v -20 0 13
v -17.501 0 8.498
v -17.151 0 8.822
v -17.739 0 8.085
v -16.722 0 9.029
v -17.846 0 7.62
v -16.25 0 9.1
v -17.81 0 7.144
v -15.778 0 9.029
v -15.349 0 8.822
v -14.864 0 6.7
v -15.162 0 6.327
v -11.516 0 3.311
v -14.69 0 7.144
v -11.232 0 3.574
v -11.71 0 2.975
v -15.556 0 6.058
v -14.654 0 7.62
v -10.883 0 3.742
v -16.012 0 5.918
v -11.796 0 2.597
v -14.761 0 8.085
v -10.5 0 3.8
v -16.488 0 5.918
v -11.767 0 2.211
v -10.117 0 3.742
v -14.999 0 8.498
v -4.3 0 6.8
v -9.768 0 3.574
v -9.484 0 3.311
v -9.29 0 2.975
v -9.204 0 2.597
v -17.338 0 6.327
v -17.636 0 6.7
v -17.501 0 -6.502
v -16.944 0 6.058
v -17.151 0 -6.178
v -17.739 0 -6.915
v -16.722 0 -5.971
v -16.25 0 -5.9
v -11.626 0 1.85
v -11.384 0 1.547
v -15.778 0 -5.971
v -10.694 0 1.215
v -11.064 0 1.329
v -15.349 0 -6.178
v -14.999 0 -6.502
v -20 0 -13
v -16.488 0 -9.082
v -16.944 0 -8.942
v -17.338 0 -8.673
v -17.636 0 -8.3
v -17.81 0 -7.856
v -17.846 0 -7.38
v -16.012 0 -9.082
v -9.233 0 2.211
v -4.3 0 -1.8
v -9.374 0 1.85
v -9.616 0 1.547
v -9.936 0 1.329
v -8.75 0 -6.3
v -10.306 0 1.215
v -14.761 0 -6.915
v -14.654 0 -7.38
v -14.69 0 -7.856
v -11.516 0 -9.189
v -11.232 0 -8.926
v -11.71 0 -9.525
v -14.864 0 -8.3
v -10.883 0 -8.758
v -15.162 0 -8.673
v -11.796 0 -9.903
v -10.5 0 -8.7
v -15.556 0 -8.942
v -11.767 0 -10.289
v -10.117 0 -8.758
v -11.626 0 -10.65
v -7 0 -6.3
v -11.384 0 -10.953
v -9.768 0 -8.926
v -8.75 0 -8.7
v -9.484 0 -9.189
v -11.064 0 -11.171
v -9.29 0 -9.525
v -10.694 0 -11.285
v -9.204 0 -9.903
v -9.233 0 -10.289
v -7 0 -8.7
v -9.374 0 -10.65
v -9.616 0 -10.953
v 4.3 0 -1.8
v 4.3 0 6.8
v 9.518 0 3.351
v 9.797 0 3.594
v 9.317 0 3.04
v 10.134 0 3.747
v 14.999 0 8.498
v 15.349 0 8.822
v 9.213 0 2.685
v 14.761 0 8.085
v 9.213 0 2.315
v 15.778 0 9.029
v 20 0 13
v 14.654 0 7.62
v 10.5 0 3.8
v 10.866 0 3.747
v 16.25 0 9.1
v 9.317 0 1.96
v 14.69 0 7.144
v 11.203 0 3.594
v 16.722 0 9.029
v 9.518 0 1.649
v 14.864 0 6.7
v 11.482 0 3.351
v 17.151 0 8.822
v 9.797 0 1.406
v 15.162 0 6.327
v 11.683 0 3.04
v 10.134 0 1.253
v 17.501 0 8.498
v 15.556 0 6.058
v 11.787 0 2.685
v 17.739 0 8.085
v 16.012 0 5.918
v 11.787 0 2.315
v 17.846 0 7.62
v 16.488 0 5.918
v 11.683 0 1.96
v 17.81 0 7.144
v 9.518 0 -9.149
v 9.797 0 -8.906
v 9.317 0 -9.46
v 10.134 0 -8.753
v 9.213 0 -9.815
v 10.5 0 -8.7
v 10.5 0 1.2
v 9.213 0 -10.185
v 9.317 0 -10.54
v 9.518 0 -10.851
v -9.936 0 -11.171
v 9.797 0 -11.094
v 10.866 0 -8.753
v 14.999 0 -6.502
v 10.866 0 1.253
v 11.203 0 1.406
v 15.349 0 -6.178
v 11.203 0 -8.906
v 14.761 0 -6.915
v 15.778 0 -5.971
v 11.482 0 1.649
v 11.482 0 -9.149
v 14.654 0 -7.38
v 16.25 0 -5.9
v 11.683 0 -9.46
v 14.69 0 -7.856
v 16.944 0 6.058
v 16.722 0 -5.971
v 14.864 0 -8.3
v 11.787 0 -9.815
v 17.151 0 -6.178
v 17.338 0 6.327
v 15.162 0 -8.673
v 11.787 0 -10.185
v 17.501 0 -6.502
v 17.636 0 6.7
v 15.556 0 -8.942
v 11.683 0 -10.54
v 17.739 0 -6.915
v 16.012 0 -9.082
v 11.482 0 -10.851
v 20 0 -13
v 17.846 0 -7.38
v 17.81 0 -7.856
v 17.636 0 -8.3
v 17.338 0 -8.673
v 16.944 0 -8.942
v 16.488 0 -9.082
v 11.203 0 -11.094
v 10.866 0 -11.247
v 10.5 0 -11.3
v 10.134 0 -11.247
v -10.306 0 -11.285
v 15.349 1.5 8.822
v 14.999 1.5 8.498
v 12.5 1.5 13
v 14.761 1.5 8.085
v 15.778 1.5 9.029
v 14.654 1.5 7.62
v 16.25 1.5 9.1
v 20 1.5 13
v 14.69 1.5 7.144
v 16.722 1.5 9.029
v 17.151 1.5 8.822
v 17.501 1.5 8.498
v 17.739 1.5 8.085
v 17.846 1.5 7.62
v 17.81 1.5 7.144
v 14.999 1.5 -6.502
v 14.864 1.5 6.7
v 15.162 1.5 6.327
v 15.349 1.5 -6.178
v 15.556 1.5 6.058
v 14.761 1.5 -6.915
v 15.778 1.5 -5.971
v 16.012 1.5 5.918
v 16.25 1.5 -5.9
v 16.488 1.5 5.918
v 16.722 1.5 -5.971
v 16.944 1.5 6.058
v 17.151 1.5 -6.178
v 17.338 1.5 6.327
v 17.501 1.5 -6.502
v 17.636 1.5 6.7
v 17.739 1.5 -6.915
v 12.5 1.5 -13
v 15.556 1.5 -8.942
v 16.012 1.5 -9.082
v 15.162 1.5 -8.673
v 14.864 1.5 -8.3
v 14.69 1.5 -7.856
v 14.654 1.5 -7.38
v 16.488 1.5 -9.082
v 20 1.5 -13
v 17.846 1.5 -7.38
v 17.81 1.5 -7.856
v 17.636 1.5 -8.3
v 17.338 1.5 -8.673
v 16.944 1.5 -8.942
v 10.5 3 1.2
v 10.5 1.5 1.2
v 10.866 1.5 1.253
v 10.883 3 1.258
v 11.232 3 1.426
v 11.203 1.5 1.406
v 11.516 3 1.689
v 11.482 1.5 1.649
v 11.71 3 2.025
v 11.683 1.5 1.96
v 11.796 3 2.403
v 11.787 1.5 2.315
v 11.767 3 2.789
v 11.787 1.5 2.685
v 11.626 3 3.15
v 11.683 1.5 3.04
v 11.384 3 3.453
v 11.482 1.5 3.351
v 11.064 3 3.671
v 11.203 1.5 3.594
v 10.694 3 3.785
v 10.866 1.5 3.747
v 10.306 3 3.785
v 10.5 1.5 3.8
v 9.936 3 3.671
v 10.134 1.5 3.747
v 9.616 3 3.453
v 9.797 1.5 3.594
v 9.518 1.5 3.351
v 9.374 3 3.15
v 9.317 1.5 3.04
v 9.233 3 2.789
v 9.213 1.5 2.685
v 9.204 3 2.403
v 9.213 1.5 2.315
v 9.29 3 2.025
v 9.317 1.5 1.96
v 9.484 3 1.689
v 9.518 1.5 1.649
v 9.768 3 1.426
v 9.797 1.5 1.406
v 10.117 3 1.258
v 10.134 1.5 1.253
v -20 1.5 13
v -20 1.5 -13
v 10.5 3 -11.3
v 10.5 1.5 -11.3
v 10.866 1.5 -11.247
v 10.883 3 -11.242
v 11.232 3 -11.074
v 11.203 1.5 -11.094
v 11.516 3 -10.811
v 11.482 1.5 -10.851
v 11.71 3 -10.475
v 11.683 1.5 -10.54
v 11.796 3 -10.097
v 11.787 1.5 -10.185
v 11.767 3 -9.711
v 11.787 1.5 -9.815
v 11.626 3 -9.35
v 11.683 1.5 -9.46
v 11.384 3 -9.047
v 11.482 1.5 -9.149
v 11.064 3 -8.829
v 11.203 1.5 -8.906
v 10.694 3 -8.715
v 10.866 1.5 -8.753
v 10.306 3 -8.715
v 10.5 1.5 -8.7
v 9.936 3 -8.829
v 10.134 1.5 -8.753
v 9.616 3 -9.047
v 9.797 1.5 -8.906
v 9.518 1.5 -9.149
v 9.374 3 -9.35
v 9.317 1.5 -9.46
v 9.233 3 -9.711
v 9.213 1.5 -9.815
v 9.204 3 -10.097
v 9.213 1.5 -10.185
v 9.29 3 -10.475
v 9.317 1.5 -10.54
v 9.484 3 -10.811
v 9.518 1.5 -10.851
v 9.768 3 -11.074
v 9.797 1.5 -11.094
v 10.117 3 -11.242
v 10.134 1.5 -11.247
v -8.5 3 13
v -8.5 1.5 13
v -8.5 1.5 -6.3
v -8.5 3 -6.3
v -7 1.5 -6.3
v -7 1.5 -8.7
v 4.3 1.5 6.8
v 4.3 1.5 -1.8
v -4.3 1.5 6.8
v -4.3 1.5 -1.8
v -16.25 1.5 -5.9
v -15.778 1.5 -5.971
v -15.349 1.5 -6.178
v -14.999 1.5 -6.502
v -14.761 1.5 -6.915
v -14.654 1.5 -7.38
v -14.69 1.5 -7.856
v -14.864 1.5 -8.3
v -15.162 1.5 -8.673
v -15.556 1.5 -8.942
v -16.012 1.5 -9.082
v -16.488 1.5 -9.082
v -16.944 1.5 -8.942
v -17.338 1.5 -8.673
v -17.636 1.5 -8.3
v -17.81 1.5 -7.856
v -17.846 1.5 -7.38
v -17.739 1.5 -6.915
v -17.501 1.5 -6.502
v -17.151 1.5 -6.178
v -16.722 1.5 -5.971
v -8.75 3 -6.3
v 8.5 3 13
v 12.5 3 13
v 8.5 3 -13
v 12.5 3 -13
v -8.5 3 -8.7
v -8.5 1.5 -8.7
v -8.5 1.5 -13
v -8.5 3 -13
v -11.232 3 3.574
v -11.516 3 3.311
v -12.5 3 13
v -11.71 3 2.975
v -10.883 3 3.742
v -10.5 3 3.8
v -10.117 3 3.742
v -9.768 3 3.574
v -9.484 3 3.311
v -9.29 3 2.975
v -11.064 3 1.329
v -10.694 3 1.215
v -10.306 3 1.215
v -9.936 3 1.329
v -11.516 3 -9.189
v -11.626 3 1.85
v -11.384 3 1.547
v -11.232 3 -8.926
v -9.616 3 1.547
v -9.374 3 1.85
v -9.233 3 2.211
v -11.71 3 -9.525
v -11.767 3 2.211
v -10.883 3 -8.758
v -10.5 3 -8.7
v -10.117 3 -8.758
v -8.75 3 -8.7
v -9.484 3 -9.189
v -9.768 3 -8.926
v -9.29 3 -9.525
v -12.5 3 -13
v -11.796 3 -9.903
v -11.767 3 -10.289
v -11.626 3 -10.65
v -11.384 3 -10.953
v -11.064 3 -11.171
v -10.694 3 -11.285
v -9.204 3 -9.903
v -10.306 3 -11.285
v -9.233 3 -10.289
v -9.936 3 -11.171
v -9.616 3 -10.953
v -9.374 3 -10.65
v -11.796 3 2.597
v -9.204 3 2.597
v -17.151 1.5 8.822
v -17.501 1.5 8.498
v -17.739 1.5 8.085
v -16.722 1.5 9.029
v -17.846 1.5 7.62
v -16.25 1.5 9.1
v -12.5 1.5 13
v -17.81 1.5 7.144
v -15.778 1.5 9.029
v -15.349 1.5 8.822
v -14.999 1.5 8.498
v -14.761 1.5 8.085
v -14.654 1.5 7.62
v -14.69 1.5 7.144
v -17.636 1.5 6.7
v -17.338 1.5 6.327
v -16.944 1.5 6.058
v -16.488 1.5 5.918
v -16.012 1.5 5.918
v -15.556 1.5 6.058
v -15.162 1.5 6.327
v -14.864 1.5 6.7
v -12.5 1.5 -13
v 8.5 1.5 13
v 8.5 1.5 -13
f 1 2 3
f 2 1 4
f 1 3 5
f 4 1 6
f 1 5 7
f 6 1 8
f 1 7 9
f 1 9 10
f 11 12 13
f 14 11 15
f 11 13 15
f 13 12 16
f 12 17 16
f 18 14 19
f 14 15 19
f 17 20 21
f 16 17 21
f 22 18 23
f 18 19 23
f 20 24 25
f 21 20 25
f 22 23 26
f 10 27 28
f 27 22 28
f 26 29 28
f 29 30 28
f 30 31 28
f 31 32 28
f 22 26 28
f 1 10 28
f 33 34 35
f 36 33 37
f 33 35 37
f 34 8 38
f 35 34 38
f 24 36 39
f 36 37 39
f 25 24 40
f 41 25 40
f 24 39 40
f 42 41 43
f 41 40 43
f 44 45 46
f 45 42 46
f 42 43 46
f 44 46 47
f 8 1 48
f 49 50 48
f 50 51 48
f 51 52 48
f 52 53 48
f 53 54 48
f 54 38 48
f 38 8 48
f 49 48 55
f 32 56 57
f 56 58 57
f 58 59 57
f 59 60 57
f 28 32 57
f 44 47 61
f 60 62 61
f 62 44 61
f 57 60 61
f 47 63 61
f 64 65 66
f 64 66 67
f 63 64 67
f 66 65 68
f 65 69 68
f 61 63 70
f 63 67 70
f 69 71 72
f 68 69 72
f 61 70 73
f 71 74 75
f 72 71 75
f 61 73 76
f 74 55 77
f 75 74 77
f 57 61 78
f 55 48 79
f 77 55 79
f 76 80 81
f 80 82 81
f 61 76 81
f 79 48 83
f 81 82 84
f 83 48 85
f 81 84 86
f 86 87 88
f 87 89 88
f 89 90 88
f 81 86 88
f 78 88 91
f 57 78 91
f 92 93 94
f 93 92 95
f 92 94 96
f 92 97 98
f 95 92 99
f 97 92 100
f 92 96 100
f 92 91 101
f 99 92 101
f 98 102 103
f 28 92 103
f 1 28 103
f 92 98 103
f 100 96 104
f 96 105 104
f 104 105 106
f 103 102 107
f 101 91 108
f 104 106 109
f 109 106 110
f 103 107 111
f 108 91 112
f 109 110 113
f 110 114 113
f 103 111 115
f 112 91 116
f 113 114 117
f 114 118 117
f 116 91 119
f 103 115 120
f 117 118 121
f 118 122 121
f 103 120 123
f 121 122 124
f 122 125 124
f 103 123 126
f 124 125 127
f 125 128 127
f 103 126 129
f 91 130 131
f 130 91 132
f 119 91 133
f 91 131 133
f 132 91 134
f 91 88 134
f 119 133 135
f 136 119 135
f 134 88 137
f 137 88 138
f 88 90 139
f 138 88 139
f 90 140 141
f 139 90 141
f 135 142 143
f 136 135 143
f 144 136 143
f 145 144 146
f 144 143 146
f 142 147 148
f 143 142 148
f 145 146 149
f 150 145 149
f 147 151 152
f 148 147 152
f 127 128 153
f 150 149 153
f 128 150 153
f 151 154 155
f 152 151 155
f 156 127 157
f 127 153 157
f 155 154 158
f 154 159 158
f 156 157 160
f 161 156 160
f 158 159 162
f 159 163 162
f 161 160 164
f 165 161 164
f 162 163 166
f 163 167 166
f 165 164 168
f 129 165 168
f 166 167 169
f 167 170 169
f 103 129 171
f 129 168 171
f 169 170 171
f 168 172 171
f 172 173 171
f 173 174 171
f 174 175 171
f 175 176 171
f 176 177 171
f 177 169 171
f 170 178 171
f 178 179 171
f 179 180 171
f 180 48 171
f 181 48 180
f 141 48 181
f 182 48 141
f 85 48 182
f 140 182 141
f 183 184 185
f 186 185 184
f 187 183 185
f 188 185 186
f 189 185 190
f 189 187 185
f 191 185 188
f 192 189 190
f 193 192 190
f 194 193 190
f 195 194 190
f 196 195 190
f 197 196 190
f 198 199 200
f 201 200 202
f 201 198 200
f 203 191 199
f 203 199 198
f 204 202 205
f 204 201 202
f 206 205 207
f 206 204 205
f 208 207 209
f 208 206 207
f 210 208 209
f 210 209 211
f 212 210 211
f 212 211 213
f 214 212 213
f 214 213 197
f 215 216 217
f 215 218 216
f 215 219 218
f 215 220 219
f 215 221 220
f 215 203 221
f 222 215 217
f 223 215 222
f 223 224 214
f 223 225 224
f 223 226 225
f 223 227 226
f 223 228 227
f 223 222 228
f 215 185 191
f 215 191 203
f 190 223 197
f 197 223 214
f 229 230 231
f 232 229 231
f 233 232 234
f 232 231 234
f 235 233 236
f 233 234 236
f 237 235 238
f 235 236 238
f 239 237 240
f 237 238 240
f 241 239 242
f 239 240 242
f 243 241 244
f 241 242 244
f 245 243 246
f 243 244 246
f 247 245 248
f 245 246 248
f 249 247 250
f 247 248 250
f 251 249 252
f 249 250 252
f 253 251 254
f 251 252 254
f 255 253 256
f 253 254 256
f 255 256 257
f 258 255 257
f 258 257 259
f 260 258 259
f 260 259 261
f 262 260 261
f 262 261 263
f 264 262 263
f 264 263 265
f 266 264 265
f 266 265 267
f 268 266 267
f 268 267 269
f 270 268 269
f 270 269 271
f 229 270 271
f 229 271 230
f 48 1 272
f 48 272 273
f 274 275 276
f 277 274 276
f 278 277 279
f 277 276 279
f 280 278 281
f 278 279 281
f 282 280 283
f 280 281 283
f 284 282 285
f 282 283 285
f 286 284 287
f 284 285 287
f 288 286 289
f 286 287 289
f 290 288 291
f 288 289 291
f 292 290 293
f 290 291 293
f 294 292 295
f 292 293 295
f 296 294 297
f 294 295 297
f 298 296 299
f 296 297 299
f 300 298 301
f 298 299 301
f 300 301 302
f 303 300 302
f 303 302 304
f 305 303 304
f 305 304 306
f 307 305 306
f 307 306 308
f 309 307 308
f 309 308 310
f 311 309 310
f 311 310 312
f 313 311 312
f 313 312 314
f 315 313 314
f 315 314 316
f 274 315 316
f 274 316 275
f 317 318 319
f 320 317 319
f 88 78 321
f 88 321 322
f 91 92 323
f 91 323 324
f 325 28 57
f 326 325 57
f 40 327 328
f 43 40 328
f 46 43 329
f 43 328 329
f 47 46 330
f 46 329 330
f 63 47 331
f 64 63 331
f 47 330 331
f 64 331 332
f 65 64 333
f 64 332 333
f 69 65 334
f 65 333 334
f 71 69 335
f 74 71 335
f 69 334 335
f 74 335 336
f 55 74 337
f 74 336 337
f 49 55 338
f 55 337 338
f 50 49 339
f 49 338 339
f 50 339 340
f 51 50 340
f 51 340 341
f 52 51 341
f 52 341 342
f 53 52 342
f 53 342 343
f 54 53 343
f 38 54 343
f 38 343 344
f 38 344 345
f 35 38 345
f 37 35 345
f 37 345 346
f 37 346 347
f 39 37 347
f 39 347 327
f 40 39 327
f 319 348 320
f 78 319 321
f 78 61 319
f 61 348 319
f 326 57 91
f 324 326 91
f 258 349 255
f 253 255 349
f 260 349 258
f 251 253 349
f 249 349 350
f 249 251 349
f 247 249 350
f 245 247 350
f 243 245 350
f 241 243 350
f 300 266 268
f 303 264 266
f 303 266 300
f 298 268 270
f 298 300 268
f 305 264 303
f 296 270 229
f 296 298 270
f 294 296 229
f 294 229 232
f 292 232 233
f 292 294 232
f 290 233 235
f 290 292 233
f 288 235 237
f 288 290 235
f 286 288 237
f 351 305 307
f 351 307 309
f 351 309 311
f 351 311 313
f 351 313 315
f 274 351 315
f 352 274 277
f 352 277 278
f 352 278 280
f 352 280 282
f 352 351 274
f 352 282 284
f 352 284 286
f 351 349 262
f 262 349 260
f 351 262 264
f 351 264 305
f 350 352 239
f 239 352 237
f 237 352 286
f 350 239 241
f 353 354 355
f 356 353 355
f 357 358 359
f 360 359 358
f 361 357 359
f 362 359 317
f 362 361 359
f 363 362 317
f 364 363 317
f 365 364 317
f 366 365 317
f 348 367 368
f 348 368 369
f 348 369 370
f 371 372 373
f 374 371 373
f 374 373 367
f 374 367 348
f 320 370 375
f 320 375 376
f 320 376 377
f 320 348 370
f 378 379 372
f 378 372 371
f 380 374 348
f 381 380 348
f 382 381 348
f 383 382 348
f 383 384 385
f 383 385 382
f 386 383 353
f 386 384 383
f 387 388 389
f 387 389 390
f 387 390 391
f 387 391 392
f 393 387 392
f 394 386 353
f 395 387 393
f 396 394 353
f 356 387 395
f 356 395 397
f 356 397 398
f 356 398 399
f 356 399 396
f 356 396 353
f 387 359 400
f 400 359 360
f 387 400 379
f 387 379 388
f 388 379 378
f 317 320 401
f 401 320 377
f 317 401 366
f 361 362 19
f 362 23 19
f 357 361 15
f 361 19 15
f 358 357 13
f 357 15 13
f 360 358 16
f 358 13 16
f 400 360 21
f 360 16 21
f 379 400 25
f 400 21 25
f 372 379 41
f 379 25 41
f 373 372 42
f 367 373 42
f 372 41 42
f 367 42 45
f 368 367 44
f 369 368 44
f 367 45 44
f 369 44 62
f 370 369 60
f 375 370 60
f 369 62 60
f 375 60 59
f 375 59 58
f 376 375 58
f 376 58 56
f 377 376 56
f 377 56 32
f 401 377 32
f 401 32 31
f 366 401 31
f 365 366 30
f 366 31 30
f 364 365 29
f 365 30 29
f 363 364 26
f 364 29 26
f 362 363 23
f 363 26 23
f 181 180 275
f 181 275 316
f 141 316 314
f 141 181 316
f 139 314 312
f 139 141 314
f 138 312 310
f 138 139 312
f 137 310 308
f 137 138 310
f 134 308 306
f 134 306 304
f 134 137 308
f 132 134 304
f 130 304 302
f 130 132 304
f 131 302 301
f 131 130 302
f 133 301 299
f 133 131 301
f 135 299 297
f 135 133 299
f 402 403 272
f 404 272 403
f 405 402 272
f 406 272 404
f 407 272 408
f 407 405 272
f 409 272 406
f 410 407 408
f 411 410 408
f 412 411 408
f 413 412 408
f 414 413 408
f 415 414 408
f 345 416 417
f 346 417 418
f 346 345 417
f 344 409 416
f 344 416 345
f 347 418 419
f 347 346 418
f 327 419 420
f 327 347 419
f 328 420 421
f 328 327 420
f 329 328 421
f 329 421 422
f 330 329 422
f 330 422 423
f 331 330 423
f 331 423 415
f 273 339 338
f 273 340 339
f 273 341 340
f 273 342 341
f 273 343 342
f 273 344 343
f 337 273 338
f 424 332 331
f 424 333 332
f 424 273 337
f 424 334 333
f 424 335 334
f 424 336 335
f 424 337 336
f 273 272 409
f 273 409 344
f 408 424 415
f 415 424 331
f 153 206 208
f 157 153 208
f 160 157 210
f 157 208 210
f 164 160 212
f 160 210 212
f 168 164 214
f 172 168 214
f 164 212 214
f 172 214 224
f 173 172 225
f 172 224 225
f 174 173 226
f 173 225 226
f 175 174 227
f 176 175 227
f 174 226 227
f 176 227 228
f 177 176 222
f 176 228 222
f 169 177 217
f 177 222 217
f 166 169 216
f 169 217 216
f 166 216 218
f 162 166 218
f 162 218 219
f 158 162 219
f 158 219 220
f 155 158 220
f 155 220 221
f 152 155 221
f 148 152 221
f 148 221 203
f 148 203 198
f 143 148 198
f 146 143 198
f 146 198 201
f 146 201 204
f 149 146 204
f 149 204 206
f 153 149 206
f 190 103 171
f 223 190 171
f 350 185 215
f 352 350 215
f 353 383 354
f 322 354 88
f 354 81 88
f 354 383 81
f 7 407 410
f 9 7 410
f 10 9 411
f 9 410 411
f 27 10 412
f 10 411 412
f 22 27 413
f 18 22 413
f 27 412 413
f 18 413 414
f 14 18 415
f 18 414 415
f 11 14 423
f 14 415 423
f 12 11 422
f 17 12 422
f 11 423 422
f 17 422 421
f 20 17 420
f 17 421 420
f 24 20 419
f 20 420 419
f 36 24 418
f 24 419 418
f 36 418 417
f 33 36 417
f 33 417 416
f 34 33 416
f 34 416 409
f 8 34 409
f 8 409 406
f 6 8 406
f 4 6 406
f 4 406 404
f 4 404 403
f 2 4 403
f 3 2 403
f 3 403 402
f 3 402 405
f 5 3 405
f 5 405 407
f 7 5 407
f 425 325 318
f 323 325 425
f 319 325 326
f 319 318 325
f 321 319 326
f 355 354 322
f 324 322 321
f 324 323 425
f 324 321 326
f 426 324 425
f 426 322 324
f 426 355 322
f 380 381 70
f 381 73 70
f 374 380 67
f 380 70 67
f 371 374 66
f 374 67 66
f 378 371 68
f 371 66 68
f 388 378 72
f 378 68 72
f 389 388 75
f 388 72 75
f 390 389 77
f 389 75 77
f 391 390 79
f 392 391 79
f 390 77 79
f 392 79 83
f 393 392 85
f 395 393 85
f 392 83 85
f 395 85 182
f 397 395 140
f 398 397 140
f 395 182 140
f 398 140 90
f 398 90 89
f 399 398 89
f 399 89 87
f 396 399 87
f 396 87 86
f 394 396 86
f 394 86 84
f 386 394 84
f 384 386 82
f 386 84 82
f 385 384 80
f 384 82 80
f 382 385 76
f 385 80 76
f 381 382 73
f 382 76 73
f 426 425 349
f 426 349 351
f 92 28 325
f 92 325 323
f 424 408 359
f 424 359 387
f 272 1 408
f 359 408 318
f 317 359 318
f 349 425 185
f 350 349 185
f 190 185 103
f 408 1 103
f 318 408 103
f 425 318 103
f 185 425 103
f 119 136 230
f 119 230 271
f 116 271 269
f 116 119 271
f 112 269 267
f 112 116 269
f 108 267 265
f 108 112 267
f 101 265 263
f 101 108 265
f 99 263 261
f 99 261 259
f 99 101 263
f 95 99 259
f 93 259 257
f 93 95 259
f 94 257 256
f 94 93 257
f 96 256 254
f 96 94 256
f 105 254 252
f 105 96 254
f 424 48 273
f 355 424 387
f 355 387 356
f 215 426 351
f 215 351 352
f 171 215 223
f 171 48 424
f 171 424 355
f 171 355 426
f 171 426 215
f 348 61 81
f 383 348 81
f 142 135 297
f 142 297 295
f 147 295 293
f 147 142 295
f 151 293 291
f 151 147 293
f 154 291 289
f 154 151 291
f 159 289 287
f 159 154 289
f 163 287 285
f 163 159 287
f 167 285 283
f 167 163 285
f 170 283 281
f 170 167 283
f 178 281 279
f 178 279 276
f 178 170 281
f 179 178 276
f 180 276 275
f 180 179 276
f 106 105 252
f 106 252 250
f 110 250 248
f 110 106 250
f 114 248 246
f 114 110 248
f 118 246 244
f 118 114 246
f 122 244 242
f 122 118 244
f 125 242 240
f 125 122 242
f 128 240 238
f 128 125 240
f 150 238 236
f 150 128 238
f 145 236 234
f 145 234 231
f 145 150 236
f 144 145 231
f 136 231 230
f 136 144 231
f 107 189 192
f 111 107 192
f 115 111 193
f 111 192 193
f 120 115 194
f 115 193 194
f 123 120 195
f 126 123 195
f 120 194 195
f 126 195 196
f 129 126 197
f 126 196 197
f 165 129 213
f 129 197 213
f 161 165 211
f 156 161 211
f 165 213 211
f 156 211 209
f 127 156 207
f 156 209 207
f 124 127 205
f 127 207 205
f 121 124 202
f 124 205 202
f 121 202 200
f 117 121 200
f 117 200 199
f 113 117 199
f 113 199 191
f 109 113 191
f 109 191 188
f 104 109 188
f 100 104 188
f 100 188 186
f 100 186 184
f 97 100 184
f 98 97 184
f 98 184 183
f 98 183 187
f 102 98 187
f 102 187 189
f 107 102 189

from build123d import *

# Parameters (mm, degrees)
SKETCH2_W               = 40
SKETCH2_H               = 26
SKETCH2_R               = 1.3
SKETCH2_W_2             = 8.6
SKETCH2_H_2             = 8.6
BOSS_EXTRUDE1_DEPTH     = 1.5
SKETCH3_W               = 4
SKETCH3_H               = 26
BOSS_EXTRUDE2_DEPTH     = 1.5
SKETCH5_R               = 1.3
CUT_EXTRUDE1_DEPTH      = 25.04163056
CUT_EXTRUDE3_DEPTH      = 24.900836805
CUT_EXTRUDE3_DEPTH_BACK = 24.900836805
SKETCH6_W               = 1.75
SKETCH6_H               = 2.4
SKETCH7_R               = 1.6
CUT_EXTRUDE4_DEPTH      = 2


with BuildPart() as part:
    # Sketch2 → Boss-Extrude1 (new body)
    with BuildSketch(Plane(origin=(0, 0, 0), x_dir=(1, 0, 0), z_dir=(0, 1, 0))):
        Rectangle(SKETCH2_W, SKETCH2_H)
        with Locations(Location((-10.5, -2.5, 0), (0, 0, 270))):
            Circle(SKETCH2_R, mode=Mode.SUBTRACT)
        with Locations(Location((-10.5, 10, 0), (0, 0, 270))):
            Circle(SKETCH2_R, mode=Mode.SUBTRACT)
        with Locations(Location((10.5, 10, 0), (0, 0, 270))):
            Circle(SKETCH2_R, mode=Mode.SUBTRACT)
        with Locations(Location((10.5, -2.5, 0), (0, 0, 270))):
            Circle(SKETCH2_R, mode=Mode.SUBTRACT)
        with Locations((0, -2.5)):
            Rectangle(SKETCH2_W_2, SKETCH2_H_2, mode=Mode.SUBTRACT)
    extrude(amount=BOSS_EXTRUDE1_DEPTH)

    # Sketch3 → Boss-Extrude2 (add)
    with BuildSketch(Plane(origin=(0, 1.5, 0), x_dir=(1, 0, 0), z_dir=(0, 1, 0))):
        with Locations((-10.5, 0)):
            Rectangle(SKETCH3_W, SKETCH3_H)
        with Locations((10.5, 0)):
            Rectangle(SKETCH3_W, SKETCH3_H)
    extrude(amount=BOSS_EXTRUDE2_DEPTH)

    # Sketch5 → Cut-Extrude1 (cut, through all)
    with BuildSketch(Plane.XZ):
        with Locations(Location((-10.5, 2.5, 0), (0, 0, 90))):
            Circle(SKETCH5_R)
        with Locations(Location((10.5, -10, 0), (0, 0, 270))):
            Circle(SKETCH5_R)
        with Locations(Location((10.5, 2.5, 0), (0, 0, 270))):
            Circle(SKETCH5_R)
        with Locations(Location((-10.5, -10, 0), (0, 0, 90))):
            Circle(SKETCH5_R)
    extrude(amount=-CUT_EXTRUDE1_DEPTH, mode=Mode.SUBTRACT)

    # Sketch6 → Cut-Extrude3 (cut, two sides: drawn at the far end of the back side and taken through both)
    with BuildSketch(Plane(origin=(0, 1.5, 0), x_dir=(1, 0, 0), z_dir=(0, 1, 0)).offset(-CUT_EXTRUDE3_DEPTH_BACK)):
        with Locations((-7.875, 7.5)):
            Rectangle(SKETCH6_W, SKETCH6_H)
    extrude(amount=CUT_EXTRUDE3_DEPTH + CUT_EXTRUDE3_DEPTH_BACK, mode=Mode.SUBTRACT)

    # Sketch7 → Cut-Extrude4 (cut)
    with BuildSketch(Plane(origin=(0, 1.5, 0), x_dir=(1, 0, 0), z_dir=(0, 1, 0))):
        with Locations(Location((16.25, 7.5, 0), (0, 0, 270))):
            Circle(SKETCH7_R)
        with Locations(Location((16.25, -7.5, 0), (0, 0, 270))):
            Circle(SKETCH7_R)
        with Locations(Location((-16.25, -7.5, 0), (0, 0, 270))):
            Circle(SKETCH7_R)
        with Locations(Location((-16.25, 7.5, 0), (0, 0, 270))):
            Circle(SKETCH7_R)
    extrude(amount=-CUT_EXTRUDE4_DEPTH, mode=Mode.SUBTRACT)


solid = part.part
